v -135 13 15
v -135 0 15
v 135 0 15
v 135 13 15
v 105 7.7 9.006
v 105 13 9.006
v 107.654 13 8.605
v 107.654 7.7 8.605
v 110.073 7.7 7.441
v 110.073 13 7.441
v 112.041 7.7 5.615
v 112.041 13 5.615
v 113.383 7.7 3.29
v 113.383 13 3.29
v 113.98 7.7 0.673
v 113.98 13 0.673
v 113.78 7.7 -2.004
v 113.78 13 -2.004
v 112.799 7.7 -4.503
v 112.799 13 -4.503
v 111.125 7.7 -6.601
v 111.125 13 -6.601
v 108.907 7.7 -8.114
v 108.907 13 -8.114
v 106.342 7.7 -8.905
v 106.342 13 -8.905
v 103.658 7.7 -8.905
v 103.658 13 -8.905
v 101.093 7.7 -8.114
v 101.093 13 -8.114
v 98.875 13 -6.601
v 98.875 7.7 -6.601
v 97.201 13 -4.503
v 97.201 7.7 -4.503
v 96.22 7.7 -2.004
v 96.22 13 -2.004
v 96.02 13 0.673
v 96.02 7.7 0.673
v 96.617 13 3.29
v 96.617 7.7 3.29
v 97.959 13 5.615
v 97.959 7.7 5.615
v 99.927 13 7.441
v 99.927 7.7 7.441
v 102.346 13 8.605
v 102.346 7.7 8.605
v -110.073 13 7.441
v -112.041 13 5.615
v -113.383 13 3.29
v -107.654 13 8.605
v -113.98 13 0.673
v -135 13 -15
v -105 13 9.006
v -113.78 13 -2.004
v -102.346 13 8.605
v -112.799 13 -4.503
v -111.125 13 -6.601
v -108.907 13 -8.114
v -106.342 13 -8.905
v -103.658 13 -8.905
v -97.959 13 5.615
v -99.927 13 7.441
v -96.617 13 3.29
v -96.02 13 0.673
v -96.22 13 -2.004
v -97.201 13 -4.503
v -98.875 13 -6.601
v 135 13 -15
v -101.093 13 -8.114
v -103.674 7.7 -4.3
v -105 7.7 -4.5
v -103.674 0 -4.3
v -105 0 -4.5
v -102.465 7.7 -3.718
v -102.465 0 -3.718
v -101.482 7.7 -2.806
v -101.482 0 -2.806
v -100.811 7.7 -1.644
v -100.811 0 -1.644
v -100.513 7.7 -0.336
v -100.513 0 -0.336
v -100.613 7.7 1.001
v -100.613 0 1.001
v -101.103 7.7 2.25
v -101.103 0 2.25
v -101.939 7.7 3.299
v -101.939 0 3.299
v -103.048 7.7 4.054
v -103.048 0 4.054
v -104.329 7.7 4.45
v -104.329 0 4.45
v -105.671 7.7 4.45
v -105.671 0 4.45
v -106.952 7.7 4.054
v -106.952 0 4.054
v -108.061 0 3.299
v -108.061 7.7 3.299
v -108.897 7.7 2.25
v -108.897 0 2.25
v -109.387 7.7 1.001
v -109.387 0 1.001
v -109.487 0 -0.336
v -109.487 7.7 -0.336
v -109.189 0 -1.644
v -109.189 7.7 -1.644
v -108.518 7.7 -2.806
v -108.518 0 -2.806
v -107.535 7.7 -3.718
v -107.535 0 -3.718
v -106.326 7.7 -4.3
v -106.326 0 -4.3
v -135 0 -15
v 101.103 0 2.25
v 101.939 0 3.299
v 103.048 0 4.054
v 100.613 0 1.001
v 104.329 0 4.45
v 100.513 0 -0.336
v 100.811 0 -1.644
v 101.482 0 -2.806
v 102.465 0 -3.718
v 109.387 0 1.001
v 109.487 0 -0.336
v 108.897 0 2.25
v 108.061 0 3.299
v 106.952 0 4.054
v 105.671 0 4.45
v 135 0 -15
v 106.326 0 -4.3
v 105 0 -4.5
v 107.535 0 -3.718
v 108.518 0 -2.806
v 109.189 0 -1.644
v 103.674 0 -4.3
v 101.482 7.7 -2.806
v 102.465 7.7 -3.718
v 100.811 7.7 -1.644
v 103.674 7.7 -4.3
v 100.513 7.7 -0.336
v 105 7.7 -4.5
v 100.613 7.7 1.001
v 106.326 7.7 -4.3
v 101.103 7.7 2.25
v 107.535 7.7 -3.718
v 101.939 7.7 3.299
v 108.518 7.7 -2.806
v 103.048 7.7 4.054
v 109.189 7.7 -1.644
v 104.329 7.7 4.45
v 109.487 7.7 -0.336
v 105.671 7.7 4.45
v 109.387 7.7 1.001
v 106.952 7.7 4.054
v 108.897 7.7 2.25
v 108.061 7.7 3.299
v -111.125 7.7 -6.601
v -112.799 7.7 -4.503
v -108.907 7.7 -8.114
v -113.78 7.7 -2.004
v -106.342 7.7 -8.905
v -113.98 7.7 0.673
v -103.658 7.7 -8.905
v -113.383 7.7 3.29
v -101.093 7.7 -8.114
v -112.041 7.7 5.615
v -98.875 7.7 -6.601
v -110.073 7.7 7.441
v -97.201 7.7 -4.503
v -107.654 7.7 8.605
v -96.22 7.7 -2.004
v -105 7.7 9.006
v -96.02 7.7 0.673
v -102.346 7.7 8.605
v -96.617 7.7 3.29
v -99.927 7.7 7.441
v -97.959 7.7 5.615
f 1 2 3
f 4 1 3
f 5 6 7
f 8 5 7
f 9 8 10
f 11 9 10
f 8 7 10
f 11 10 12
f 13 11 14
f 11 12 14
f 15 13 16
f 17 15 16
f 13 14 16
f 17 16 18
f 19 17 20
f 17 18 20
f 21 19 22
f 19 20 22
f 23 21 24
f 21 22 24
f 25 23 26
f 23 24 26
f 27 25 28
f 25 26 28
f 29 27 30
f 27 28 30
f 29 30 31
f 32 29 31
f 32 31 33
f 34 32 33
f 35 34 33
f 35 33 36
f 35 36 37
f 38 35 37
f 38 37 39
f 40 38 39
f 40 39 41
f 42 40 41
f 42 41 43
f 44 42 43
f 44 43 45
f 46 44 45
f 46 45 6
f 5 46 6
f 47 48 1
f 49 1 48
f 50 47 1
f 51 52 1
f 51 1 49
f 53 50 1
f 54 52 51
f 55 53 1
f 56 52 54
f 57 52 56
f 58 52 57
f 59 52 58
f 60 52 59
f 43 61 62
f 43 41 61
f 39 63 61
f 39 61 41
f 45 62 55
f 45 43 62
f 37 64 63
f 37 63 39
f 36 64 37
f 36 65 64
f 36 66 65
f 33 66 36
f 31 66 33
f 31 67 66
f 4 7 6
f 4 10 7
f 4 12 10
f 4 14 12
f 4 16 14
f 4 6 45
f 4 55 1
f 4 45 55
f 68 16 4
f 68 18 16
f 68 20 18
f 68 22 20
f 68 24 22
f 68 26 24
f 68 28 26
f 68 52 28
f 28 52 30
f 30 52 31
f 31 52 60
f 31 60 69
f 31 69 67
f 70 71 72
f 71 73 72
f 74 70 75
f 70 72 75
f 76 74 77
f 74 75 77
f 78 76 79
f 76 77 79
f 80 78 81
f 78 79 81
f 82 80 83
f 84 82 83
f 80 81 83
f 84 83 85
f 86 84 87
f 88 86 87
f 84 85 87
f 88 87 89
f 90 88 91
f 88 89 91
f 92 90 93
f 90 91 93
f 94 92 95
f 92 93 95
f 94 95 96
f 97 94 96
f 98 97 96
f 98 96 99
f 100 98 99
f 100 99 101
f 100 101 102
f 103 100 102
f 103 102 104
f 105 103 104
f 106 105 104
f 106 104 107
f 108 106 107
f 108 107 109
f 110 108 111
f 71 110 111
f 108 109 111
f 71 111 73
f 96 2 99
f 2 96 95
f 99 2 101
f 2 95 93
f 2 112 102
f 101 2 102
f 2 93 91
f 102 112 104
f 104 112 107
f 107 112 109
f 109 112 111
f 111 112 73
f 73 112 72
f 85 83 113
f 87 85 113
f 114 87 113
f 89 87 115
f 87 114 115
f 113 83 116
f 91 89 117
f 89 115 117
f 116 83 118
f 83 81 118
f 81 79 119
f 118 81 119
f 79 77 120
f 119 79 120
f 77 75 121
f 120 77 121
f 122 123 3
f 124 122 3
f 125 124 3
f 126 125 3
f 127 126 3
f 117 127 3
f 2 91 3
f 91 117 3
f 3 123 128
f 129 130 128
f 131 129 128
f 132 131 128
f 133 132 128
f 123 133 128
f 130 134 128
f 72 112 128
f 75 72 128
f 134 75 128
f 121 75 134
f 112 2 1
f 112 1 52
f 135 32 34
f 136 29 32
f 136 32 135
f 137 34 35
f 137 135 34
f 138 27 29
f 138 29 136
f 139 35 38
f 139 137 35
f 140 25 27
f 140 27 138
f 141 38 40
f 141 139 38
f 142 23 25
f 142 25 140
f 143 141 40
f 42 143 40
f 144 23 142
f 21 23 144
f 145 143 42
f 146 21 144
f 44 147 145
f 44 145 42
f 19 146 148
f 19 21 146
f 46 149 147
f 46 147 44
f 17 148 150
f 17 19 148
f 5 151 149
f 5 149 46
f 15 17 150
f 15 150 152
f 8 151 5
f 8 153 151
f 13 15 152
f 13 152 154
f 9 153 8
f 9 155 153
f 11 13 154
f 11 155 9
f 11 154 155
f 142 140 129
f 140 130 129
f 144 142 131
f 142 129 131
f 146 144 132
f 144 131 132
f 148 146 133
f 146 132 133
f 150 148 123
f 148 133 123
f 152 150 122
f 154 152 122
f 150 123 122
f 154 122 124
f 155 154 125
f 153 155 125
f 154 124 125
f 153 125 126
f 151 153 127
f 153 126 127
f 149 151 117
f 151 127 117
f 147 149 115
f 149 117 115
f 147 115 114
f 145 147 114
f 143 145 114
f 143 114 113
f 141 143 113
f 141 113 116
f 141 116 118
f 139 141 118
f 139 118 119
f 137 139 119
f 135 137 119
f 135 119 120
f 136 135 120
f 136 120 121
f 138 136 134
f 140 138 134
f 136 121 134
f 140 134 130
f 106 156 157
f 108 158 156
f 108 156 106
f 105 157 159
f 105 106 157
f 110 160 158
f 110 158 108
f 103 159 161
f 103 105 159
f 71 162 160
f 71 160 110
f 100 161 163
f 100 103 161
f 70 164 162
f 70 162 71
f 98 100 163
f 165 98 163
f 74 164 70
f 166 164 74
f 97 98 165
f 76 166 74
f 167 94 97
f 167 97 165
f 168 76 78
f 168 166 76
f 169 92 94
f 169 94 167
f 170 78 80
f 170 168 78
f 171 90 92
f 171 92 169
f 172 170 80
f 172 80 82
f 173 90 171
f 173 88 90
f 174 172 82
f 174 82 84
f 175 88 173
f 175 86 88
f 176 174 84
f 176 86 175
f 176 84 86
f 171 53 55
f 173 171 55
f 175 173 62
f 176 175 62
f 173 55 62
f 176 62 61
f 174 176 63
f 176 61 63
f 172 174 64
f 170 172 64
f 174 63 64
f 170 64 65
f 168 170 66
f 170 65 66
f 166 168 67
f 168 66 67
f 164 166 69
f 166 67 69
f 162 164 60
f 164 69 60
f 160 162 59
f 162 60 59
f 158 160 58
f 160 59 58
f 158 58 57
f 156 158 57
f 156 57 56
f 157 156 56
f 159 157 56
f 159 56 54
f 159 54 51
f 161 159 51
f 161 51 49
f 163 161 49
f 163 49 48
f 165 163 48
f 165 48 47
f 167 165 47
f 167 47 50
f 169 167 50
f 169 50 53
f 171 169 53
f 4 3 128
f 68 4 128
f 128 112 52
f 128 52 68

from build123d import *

# Parameters (mm, degrees)
SKETCH1_W                               = 270
SKETCH1_H                               = 30
BOSS_EXTRUDE1_DEPTH                     = 13
CBORE_FOR_M8_HEX_HEAD_BOLT1_D           = 9
CBORE_FOR_M8_HEX_HEAD_BOLT1_DEPTH       = 15
CBORE_FOR_M8_HEX_HEAD_BOLT1_CBORE_D     = 18.011
CBORE_FOR_M8_HEX_HEAD_BOLT1_CBORE_DEPTH = 5.3
CBORE_FOR_M8_HEX_HEAD_BOLT1_TIP         = 2.703872786


with BuildPart() as part:
    # Sketch1 → Boss-Extrude1 (new body)
    with BuildSketch(Plane(origin=(0, 0, 0), x_dir=(1, 0, 0), z_dir=(0, 1, 0))):
        Rectangle(SKETCH1_W, SKETCH1_H)
    extrude(amount=BOSS_EXTRUDE1_DEPTH)

    # CBORE for M8 Hex Head Bolt1
    with Locations(Plane(origin=(-105, 13, 0), x_dir=(0, 0, 1), z_dir=(0, 1, 0))):
        with Locations((0, 0), (0, 210)):
            CounterBoreHole(CBORE_FOR_M8_HEX_HEAD_BOLT1_D / 2, CBORE_FOR_M8_HEX_HEAD_BOLT1_CBORE_D / 2, CBORE_FOR_M8_HEX_HEAD_BOLT1_CBORE_DEPTH, depth=CBORE_FOR_M8_HEX_HEAD_BOLT1_DEPTH)
            with Locations((0, 0, -(CBORE_FOR_M8_HEX_HEAD_BOLT1_DEPTH + CBORE_FOR_M8_HEX_HEAD_BOLT1_TIP / 2))):  # 118° drill point
                Cone(0, CBORE_FOR_M8_HEX_HEAD_BOLT1_D / 2, CBORE_FOR_M8_HEX_HEAD_BOLT1_TIP, mode=Mode.SUBTRACT)


solid = part.part
